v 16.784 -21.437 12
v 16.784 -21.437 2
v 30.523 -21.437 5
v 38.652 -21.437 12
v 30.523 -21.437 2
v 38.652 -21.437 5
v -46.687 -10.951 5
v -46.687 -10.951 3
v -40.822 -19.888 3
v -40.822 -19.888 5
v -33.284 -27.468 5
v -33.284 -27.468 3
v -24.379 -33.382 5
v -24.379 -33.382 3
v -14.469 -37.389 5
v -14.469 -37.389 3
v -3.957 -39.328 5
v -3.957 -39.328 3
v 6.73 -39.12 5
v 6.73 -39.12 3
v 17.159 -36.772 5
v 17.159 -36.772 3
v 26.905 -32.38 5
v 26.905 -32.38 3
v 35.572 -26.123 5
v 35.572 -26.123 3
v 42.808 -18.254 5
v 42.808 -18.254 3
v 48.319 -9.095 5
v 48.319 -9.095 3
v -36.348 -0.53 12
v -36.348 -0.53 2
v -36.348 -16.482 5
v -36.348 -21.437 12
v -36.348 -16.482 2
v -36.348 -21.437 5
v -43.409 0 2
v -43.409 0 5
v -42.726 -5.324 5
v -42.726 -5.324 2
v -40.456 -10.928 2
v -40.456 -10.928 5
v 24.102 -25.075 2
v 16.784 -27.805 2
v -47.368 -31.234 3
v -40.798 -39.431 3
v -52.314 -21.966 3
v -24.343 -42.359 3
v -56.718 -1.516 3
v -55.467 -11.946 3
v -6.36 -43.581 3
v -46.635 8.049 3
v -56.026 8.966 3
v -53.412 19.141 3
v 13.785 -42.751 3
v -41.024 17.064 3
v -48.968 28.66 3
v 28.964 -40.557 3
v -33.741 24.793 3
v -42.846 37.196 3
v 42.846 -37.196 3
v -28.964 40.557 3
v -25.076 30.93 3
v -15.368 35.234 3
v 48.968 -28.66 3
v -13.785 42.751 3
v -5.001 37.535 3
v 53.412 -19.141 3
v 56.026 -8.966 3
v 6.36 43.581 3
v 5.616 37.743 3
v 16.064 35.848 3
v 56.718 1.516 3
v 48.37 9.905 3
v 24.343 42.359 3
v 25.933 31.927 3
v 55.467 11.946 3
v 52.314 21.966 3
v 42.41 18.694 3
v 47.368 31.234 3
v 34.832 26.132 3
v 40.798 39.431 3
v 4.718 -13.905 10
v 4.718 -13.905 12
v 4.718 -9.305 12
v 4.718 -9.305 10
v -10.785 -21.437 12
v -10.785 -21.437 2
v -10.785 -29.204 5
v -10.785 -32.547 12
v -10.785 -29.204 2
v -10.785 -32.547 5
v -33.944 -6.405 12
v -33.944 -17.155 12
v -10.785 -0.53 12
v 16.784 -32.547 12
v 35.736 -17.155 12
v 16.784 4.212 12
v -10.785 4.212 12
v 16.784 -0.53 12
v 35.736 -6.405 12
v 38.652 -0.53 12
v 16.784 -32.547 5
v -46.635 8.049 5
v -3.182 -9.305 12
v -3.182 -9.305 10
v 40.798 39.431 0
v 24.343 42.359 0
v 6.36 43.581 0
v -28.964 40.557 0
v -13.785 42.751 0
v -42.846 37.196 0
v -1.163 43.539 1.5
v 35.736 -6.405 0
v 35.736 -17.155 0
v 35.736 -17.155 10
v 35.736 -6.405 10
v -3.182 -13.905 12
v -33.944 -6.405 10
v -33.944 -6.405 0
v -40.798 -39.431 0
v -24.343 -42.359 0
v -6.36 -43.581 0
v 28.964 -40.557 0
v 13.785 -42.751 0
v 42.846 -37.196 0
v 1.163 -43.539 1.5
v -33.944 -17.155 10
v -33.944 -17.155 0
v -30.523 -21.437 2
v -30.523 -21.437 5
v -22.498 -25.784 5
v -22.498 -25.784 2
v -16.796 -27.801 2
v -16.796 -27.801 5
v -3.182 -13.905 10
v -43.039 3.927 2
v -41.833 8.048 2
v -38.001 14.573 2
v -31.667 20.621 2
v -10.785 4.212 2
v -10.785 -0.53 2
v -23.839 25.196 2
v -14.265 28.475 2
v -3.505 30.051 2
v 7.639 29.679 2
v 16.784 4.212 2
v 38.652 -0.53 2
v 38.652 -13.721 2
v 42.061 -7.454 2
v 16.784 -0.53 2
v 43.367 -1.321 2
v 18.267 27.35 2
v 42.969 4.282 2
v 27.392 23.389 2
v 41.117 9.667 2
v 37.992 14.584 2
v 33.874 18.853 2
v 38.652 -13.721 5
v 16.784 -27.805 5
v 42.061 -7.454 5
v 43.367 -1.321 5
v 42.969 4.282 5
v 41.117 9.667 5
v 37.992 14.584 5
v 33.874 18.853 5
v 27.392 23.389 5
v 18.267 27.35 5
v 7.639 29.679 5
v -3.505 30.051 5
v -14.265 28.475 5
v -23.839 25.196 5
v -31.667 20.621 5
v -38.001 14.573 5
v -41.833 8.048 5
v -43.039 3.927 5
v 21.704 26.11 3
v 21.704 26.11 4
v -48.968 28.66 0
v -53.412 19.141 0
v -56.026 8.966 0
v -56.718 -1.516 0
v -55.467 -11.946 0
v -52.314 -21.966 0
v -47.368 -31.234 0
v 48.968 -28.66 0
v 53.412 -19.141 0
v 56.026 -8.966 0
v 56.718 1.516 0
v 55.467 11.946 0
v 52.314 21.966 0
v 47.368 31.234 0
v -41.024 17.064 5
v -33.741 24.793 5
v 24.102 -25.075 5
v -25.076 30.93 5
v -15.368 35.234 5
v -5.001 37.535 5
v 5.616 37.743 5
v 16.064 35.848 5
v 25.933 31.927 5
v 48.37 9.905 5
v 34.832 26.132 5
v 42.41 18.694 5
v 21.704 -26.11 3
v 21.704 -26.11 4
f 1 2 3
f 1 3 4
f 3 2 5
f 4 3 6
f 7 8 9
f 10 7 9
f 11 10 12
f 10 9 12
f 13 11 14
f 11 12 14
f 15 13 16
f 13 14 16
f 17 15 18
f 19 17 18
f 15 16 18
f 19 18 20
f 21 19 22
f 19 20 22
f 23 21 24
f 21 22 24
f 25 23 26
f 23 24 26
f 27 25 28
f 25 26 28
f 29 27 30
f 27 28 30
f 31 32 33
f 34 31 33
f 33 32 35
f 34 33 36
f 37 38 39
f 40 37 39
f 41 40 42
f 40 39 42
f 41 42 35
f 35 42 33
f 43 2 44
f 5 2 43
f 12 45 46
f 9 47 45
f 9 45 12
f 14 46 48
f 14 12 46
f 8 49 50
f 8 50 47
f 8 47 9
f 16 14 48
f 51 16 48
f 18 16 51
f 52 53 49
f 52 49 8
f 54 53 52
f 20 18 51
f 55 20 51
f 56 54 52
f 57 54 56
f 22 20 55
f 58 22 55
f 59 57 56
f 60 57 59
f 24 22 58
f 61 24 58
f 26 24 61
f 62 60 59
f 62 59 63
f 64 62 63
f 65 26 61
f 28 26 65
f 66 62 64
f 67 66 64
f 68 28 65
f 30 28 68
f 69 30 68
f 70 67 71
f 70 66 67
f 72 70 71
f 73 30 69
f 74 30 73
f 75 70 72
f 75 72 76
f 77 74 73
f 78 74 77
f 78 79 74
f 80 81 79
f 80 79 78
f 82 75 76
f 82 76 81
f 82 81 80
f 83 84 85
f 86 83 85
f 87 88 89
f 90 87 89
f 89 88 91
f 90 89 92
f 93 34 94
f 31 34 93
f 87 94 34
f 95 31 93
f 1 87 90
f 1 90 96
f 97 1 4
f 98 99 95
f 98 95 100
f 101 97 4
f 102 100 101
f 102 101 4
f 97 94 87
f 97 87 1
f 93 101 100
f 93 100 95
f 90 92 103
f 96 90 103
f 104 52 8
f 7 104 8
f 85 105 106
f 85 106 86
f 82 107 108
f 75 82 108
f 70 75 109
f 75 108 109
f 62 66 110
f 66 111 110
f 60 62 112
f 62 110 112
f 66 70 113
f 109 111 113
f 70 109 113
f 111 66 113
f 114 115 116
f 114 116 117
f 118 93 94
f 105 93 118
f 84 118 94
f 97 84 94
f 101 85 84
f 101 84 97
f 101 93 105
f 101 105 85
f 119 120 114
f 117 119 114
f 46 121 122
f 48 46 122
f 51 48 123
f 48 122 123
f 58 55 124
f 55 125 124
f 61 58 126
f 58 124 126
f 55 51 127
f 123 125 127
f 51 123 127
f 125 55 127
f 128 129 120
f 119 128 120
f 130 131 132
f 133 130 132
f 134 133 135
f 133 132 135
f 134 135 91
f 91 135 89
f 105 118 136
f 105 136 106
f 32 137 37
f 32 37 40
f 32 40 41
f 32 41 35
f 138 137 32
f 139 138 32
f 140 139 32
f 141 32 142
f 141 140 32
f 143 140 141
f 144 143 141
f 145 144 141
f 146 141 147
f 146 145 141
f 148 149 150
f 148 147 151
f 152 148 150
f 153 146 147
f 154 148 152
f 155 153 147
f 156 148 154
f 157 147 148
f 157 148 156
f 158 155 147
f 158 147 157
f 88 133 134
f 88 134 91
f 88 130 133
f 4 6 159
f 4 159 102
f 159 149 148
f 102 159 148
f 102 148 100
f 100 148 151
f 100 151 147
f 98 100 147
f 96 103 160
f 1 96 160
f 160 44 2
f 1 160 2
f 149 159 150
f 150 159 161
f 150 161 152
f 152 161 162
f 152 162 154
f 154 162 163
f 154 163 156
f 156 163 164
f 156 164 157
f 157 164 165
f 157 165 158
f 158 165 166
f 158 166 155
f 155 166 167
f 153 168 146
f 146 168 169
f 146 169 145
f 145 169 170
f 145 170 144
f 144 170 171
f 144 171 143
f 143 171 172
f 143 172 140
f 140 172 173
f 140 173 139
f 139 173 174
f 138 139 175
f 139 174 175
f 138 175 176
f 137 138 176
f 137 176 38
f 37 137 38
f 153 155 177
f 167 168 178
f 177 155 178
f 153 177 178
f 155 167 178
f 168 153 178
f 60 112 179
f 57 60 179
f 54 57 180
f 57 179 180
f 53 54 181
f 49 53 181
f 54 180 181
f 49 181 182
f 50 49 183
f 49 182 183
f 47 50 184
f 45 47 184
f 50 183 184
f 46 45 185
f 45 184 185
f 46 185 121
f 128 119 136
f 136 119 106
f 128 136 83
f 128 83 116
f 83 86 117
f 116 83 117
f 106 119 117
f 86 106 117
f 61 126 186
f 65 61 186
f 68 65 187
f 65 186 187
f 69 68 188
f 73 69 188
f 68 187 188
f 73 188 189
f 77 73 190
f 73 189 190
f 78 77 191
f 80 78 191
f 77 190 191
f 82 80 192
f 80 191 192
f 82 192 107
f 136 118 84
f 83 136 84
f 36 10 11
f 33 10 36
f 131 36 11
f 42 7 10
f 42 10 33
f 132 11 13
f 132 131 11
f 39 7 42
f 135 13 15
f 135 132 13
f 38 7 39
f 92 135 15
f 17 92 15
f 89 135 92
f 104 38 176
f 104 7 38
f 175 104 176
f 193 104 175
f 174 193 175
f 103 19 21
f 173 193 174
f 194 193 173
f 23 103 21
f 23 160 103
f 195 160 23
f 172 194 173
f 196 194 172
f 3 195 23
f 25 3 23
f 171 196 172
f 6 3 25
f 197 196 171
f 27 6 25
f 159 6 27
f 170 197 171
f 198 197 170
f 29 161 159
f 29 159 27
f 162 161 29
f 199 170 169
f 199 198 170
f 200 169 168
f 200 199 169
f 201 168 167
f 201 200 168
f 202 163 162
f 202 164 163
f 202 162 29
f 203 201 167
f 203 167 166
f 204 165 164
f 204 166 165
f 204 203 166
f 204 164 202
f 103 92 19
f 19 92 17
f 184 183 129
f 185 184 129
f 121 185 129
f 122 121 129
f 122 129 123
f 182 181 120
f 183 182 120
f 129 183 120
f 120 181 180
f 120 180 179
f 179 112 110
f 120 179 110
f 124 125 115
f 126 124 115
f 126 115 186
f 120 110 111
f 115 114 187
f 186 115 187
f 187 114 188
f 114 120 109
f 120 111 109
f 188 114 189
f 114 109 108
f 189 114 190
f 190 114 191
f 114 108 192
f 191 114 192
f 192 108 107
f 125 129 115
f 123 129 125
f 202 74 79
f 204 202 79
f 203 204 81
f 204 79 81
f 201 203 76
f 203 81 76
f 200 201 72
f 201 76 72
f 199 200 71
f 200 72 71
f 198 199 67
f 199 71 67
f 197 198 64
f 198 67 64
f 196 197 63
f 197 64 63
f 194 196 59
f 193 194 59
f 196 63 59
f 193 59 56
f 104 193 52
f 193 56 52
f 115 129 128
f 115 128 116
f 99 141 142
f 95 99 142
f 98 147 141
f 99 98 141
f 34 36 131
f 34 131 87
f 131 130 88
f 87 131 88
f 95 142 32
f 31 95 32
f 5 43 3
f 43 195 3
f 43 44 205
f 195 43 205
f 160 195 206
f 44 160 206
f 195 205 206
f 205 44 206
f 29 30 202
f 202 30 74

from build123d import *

# Parameters (mm, degrees)
F1_DEPTH  = 3
F2_DEPTH  = 5
F4_DEPTH  = 3
F6_DEPTH  = 10
F7_W      = 69.68
F7_H      = 10.75
F8_DEPTH  = 25
F9_DEPTH  = 23
F10_W     = 7.9
F10_H     = 4.6
F11_DEPTH = 25


with BuildPart() as f1:
    # F0 (on Top) → F1 (new body)
    with BuildSketch(Plane.XY):
        with BuildLine():
            ThreePointArc((-42.845539618, 37.1958105908), (-56.7183506808, -1.5156802814), (-40.7978468614, -39.4310066082))
            add(Edge.make_bspline(
                [(-40.7978468614, -39.4310066082), (1.3221603939, -49.4766328995), (42.845539618, -37.1958105908)],
                knots=[4.2174235222, 4.2174235222, 4.2174235222, 5.2073544386, 5.2073544386, 5.2073544386], degree=2, weights=[1, 0.8799851178, 1]))
            ThreePointArc((42.845539618, -37.1958105908), (56.7183506808, 1.5156802814), (40.7978468614, 39.4310066082))
            add(Edge.make_bspline(
                [(40.7978468614, 39.4310066082), (-1.3221603939, 49.4766328995), (-42.845539618, 37.1958105908)],
                knots=[1.0758308686, 1.0758308686, 1.0758308686, 2.065761785, 2.065761785, 2.065761785], degree=2, weights=[1, 0.8799851178, 1]))
        make_face()
        with BuildLine():
            Line((-46.686543786, -10.9511355131), (-46.6353931233, 8.0487956344))
            ThreePointArc((-46.6353931233, 8.0487956344), (0.3020996759, 37.90300692), (48.3699485287, 9.9050772031))
            Line((48.3699485287, 9.9050772031), (48.318797866, -9.0948539444))
            ThreePointArc((48.318797866, -9.0948539444), (1.3919508256, -39.4939200459), (-46.686543786, -10.9511355131))
        make_face(mode=Mode.SUBTRACT)
    extrude(amount=F1_DEPTH)

    # F0 (on Top) → F2 (join)
    with BuildSketch(Plane.XY):
        with BuildLine():
            ThreePointArc((48.3699485287, 9.9050772031), (0.3020996759, 37.90300692), (-46.6353931233, 8.0487956344))
            Line((-46.6353931233, 8.0487956344), (-46.686543786, -10.9511355131))
            ThreePointArc((-46.686543786, -10.9511355131), (1.3919508256, -39.4939200459), (48.318797866, -9.0948539444))
            Line((48.318797866, -9.0948539444), (48.3699485287, 9.9050772031))
        make_face()
    extrude(amount=F2_DEPTH)

    # F3 (on face) → F4 (cut)
    with BuildSketch(Plane.XY.offset(5)):
        with BuildLine():
            add(Edge.make_bspline(
                [(-43.4085391462, 0), (-43.4085391462, -52.2202545458), (21.7042695731, -26.1101272729), (86.8170782924, 0), (21.7042695731, 26.1101272729), (-43.4085391462, 52.2202545458), (-43.4085391462, 0)],
                knots=[0, 0, 0, 2.0943951024, 2.0943951024, 4.1887902048, 4.1887902048, 6.2831853072, 6.2831853072, 6.2831853072], degree=2, weights=[1, 0.5, 1, 0.5, 1, 0.5, 1]))
        make_face()
    extrude(amount=-F4_DEPTH, mode=Mode.SUBTRACT)

    # F5 (on face) → F6 (join)
    with BuildSketch(Plane.XY.offset(2)):
        Polygon((-36.3475600258, -0.5302710927), (-36.3475600258, -21.4373511259), (-10.7850488275, -21.4373511259), (-10.7850488275, -32.5465984643), (16.7838335037, -32.5465984643), (16.7838335037, -21.4373511259), (38.6524399742, -21.4373511259), (38.6524399742, -0.5302710927), (16.7838335037, -0.5302710927), (16.7838335037, 4.211912863), (-10.7850488275, 4.211912863), (-10.7850488275, -0.5302710927), align=None)
    extrude(amount=F6_DEPTH)

    # F7 (on face) → F8 (join)
    with BuildSketch(Plane.XY.offset(12)):
        with Locations((0.8963420987, -11.7802812491)):
            Rectangle(F7_W, F7_H)
    extrude(amount=-F8_DEPTH)

    # F9 (cut): a face of the model
    f9_faces = [f1.faces().sort_by_distance(p)[0] for p in [
        (0.8963420987, -11.7802812491, -13),
    ]]
    extrude(f9_faces, amount=-F9_DEPTH, mode=Mode.SUBTRACT)

    # F10 (on face) → F11 (cut)
    with BuildSketch(Plane.XY.offset(12)):
        with Locations((0.7682931609, -11.6048155945)):
            Rectangle(F10_W, F10_H)
    extrude(amount=-F11_DEPTH, mode=Mode.SUBTRACT)


solid = f1.part
